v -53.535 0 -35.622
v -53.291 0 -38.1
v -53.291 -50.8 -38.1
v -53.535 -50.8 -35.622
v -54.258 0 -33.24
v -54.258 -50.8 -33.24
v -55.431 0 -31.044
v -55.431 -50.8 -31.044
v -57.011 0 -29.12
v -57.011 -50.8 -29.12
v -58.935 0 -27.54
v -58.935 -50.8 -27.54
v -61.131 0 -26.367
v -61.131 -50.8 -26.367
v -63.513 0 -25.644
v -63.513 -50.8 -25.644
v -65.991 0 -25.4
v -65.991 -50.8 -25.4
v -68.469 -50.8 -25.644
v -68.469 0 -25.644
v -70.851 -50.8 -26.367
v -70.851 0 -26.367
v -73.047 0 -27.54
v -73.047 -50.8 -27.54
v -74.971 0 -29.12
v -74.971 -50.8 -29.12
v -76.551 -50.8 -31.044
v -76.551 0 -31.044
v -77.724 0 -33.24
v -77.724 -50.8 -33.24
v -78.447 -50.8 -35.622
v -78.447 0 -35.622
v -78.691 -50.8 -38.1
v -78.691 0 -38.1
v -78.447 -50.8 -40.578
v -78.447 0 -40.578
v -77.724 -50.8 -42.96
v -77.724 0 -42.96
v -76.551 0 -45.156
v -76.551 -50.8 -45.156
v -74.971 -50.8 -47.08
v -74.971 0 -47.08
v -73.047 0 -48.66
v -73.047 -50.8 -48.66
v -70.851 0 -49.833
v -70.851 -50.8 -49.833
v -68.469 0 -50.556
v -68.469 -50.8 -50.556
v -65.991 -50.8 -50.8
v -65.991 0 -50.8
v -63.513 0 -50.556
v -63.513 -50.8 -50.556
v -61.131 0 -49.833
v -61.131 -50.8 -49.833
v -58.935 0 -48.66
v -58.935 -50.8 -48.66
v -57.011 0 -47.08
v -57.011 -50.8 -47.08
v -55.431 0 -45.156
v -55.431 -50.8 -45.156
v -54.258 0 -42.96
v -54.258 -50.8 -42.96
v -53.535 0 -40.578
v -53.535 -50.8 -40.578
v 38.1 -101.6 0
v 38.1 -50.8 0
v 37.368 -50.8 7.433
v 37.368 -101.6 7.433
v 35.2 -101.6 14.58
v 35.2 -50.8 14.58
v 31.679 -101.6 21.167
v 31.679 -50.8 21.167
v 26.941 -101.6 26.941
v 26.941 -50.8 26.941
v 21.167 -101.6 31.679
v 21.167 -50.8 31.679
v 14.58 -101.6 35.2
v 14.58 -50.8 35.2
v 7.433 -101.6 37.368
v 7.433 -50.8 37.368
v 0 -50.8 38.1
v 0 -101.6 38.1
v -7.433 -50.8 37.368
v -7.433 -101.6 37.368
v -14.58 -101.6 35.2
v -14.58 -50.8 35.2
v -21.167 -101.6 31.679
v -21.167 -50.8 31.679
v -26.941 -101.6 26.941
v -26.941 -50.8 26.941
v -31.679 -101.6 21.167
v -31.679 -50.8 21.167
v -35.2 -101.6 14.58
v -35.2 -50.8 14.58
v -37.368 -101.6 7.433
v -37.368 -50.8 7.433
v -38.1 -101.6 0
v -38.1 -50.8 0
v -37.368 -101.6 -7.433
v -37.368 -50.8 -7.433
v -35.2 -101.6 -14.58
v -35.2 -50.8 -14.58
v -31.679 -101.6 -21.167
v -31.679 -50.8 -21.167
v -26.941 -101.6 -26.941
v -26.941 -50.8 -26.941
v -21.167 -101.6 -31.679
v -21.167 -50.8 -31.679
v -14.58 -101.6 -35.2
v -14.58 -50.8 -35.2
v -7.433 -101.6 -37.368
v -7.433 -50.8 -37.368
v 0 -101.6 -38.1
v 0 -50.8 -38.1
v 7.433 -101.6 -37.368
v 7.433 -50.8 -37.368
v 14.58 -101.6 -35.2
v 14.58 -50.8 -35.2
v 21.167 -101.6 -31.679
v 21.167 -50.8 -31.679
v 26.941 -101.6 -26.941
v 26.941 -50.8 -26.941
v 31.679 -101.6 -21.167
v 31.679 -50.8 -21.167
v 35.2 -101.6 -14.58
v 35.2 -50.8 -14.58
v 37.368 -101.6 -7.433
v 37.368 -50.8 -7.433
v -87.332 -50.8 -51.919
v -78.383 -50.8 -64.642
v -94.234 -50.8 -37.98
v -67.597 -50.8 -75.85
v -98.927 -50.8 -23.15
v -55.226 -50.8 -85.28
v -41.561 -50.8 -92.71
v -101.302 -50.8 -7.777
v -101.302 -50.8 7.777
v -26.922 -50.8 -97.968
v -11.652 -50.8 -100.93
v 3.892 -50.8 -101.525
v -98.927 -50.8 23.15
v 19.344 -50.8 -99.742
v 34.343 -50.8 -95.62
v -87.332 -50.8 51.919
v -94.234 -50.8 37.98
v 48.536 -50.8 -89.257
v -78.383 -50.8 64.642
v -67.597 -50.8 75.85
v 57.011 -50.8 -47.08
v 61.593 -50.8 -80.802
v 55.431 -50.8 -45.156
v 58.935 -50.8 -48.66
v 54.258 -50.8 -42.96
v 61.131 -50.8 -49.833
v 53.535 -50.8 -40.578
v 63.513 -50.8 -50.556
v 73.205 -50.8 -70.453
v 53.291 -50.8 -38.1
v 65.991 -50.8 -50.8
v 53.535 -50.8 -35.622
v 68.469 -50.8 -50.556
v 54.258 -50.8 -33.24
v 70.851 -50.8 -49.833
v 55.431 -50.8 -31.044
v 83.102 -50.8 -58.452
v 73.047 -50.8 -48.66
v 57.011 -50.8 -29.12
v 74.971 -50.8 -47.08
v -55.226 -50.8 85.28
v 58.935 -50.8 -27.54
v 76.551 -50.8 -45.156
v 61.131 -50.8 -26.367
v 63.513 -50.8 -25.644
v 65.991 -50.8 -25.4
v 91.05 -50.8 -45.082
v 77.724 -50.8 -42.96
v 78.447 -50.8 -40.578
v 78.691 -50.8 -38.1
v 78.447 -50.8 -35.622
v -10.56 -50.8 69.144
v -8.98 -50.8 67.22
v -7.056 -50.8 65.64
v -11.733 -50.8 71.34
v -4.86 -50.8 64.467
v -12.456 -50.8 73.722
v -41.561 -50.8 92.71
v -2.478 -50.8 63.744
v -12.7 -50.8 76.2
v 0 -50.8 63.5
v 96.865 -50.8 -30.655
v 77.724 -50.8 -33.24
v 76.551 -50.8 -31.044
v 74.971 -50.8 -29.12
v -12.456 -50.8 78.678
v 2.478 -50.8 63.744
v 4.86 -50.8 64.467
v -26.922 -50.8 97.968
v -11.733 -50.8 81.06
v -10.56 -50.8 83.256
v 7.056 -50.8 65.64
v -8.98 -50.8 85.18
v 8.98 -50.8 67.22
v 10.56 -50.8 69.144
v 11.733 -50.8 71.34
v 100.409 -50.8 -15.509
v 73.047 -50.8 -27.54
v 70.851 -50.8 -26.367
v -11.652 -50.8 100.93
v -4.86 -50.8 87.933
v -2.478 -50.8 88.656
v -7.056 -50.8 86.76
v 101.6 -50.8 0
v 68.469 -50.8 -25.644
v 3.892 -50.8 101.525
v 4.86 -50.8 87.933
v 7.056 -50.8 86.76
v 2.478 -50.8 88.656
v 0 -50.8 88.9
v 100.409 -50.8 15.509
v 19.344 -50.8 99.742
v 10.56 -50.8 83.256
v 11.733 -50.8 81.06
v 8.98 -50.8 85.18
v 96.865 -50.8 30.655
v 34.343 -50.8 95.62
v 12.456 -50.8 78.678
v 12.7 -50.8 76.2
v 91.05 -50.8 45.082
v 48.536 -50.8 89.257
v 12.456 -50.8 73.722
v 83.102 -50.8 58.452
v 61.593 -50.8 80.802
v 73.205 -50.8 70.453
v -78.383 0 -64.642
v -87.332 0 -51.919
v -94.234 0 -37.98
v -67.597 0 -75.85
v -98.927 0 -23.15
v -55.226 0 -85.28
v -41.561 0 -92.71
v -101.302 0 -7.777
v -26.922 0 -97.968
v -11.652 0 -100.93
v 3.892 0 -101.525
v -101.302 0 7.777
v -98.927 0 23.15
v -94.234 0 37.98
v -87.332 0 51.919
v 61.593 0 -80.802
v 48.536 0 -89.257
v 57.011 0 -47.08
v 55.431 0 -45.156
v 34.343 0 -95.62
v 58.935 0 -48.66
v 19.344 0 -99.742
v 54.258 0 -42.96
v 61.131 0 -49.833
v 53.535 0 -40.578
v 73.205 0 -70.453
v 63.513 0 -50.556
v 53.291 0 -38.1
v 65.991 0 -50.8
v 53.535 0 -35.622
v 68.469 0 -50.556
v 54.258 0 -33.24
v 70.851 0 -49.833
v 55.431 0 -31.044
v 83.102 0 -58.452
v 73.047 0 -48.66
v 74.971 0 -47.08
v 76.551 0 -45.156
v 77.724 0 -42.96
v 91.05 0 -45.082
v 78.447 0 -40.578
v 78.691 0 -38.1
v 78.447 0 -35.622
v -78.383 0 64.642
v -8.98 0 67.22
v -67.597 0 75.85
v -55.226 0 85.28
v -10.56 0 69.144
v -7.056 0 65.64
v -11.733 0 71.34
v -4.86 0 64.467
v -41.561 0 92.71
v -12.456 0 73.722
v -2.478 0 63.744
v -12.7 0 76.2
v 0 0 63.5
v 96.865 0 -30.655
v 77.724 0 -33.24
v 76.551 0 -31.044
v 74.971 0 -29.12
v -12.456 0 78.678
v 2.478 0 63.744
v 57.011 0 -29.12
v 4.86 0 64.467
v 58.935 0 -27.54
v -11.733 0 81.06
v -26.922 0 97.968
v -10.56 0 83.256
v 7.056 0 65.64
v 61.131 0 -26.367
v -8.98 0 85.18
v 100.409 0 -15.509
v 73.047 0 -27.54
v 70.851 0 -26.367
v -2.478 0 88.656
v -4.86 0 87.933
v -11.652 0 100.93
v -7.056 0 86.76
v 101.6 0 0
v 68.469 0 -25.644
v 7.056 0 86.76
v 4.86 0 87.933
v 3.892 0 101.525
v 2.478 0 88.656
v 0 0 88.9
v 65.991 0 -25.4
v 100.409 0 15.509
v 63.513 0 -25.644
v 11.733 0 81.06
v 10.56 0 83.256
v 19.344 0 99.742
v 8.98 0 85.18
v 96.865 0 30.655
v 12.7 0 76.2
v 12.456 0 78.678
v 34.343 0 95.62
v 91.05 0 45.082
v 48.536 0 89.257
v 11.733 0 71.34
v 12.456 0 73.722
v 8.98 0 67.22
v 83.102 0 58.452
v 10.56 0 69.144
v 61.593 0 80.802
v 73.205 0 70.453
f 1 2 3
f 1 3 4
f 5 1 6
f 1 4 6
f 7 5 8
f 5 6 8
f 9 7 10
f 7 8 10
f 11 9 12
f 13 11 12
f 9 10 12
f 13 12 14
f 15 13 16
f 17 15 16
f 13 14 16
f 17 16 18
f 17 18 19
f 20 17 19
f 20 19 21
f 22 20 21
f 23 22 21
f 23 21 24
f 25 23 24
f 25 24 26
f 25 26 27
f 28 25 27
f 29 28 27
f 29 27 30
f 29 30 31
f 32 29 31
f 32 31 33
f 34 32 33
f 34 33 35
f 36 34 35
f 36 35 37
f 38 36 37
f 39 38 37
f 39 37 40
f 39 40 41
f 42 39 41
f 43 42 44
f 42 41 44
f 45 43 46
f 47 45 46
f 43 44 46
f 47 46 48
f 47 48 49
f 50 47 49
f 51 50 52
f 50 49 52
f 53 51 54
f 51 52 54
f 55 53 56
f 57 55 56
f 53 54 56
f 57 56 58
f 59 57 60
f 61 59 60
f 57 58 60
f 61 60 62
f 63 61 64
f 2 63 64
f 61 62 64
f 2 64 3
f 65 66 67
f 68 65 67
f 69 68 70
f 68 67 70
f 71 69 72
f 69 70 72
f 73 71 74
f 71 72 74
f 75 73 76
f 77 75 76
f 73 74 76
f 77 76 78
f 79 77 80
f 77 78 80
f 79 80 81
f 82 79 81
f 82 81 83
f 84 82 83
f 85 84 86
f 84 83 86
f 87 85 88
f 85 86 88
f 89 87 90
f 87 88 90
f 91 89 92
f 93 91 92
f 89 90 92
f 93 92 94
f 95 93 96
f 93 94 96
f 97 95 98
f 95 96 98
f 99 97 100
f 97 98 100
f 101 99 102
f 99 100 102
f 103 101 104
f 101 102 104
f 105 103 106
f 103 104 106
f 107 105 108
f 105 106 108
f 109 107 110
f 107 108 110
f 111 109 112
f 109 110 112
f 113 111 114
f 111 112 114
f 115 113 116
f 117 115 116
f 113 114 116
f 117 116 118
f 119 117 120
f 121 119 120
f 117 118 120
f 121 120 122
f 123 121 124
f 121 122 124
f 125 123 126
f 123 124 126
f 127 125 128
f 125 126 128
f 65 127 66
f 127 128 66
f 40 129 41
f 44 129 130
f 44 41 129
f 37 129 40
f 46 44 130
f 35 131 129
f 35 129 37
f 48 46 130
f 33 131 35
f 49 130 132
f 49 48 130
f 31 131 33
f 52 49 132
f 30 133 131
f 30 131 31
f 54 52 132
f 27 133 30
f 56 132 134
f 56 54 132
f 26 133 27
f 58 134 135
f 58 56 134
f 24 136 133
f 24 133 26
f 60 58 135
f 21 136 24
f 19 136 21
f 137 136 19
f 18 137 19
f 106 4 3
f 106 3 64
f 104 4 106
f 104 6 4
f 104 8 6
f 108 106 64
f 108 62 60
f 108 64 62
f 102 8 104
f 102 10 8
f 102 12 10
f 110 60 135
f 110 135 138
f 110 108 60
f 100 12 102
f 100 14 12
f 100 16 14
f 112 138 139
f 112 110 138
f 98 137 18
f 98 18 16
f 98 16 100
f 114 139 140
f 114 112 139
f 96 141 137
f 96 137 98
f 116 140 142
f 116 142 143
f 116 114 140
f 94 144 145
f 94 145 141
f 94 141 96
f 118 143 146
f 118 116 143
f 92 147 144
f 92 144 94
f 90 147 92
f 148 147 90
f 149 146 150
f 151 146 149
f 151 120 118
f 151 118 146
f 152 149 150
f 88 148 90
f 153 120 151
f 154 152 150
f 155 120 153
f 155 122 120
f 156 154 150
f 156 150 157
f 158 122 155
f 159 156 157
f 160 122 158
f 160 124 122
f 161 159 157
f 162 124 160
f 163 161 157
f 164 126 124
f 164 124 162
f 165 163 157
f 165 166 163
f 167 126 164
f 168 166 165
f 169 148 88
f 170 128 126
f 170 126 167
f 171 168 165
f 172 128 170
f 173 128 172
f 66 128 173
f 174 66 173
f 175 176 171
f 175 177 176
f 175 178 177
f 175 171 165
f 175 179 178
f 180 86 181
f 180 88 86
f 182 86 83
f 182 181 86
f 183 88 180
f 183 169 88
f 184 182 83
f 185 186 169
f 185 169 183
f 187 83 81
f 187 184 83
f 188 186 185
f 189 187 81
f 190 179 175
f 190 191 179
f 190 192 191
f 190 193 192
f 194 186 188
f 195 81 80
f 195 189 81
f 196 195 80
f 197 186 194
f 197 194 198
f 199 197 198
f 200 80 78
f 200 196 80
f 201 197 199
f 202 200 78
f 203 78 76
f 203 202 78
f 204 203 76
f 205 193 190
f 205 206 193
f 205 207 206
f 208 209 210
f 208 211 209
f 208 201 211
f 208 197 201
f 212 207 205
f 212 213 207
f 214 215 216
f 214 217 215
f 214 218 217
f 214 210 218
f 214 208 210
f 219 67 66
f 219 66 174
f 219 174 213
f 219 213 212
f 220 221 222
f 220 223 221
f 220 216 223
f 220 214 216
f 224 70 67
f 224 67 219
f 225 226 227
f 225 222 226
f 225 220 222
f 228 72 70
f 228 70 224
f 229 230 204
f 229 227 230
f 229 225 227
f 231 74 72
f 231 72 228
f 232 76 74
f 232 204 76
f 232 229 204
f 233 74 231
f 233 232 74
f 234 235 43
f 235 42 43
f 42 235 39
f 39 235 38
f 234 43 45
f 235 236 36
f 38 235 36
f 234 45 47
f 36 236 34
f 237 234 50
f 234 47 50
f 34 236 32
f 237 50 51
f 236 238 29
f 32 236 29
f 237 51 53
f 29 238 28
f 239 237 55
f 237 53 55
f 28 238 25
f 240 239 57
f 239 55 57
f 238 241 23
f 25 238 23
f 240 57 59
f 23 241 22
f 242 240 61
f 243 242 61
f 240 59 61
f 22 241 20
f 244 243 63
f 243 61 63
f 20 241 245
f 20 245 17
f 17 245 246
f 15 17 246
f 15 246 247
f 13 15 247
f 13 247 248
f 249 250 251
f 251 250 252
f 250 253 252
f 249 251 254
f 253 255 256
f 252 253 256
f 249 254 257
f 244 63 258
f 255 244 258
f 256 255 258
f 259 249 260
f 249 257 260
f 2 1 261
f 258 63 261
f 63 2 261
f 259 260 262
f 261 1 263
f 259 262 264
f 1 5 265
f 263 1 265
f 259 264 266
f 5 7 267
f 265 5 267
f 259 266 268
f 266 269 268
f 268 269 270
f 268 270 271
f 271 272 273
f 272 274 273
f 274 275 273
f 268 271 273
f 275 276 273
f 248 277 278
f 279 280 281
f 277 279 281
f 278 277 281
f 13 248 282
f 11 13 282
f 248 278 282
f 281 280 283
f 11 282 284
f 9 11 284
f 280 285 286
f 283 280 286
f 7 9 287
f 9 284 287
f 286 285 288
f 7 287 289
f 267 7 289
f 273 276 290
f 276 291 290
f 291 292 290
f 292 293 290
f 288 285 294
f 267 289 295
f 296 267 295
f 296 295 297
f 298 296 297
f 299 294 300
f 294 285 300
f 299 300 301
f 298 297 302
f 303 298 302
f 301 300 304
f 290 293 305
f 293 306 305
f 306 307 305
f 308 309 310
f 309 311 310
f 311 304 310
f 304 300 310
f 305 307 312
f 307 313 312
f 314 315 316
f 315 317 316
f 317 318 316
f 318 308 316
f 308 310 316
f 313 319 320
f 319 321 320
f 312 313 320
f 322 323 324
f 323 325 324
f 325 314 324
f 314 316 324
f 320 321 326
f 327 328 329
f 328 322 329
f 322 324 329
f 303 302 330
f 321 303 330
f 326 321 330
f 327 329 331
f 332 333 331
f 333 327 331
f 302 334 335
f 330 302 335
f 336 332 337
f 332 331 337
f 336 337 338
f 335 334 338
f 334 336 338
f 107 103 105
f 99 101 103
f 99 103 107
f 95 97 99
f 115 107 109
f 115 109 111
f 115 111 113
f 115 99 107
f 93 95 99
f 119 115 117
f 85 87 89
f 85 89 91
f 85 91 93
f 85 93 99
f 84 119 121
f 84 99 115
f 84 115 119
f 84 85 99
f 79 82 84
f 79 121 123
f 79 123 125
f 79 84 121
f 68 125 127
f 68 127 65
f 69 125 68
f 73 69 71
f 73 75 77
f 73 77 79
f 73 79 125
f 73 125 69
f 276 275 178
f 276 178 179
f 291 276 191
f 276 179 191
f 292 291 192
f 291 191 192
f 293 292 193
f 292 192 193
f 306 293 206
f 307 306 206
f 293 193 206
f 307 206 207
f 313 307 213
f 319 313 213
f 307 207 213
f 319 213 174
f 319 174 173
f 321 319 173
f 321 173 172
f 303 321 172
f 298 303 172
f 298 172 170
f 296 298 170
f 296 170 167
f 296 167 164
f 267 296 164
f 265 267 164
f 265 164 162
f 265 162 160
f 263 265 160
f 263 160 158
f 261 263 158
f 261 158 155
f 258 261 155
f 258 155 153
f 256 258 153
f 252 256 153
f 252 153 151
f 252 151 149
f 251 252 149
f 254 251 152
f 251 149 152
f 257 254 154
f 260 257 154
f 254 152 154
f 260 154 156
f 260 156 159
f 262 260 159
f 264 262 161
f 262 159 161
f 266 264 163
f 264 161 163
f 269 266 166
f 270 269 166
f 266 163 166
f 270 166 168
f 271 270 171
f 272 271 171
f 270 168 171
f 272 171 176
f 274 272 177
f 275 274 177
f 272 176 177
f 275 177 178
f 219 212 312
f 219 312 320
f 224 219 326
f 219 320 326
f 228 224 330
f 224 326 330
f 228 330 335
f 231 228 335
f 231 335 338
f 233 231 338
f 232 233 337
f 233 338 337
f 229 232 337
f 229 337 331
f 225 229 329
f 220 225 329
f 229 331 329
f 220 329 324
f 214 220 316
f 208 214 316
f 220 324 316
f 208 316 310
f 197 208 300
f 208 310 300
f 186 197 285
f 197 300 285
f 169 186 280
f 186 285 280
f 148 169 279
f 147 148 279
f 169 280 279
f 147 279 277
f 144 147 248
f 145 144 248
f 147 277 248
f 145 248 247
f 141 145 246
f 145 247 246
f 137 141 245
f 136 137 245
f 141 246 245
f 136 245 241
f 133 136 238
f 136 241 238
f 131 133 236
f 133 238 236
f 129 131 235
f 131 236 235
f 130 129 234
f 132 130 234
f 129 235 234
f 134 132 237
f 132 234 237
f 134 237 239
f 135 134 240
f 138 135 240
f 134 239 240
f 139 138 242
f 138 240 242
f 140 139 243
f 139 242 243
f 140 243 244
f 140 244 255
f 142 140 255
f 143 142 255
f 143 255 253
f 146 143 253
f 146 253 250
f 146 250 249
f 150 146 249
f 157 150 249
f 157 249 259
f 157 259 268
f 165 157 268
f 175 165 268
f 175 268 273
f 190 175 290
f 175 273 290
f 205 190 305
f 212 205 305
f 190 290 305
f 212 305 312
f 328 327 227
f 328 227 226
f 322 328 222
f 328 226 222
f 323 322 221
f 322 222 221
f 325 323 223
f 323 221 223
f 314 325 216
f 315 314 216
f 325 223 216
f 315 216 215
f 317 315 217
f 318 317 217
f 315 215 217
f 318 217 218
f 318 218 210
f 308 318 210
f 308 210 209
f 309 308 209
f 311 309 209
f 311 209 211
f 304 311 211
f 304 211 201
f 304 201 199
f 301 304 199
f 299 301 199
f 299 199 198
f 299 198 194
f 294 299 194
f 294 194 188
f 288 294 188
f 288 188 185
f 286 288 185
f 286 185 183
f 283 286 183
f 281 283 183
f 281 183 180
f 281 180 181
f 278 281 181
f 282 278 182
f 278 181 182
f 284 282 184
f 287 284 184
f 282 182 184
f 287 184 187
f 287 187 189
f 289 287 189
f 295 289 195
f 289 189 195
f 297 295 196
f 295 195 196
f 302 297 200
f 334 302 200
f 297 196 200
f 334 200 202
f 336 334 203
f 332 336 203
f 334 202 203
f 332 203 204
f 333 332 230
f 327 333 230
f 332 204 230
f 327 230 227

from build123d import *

# Parameters (mm, degrees)
F0_R     = 101.6
F1_DEPTH = 50.8
F2_R     = 38.1
F3_DEPTH = 50.8
F4_R     = 12.7
F5_DEPTH = 87.376


with BuildPart() as f1:
    # F0 (on Front) → F1 (new body)
    with BuildSketch(Plane.XZ):
        Circle(F0_R)
    extrude(amount=F1_DEPTH)

    # F2 (on face) → F3 (join)
    with BuildSketch(Plane.XZ.offset(50.8)):
        Circle(F2_R)
    extrude(amount=F3_DEPTH)

    # F4 (on face) → F5 (cut)
    with BuildSketch(Plane.XZ.offset(50.8)):
        with Locations((0, 76.2)):
            Circle(F4_R)
        with Locations((-65.991136, -38.1)):
            Circle(F4_R)
        with Locations((65.991136, -38.1)):
            Circle(F4_R)
    extrude(amount=-F5_DEPTH, mode=Mode.SUBTRACT)


solid = f1.part
